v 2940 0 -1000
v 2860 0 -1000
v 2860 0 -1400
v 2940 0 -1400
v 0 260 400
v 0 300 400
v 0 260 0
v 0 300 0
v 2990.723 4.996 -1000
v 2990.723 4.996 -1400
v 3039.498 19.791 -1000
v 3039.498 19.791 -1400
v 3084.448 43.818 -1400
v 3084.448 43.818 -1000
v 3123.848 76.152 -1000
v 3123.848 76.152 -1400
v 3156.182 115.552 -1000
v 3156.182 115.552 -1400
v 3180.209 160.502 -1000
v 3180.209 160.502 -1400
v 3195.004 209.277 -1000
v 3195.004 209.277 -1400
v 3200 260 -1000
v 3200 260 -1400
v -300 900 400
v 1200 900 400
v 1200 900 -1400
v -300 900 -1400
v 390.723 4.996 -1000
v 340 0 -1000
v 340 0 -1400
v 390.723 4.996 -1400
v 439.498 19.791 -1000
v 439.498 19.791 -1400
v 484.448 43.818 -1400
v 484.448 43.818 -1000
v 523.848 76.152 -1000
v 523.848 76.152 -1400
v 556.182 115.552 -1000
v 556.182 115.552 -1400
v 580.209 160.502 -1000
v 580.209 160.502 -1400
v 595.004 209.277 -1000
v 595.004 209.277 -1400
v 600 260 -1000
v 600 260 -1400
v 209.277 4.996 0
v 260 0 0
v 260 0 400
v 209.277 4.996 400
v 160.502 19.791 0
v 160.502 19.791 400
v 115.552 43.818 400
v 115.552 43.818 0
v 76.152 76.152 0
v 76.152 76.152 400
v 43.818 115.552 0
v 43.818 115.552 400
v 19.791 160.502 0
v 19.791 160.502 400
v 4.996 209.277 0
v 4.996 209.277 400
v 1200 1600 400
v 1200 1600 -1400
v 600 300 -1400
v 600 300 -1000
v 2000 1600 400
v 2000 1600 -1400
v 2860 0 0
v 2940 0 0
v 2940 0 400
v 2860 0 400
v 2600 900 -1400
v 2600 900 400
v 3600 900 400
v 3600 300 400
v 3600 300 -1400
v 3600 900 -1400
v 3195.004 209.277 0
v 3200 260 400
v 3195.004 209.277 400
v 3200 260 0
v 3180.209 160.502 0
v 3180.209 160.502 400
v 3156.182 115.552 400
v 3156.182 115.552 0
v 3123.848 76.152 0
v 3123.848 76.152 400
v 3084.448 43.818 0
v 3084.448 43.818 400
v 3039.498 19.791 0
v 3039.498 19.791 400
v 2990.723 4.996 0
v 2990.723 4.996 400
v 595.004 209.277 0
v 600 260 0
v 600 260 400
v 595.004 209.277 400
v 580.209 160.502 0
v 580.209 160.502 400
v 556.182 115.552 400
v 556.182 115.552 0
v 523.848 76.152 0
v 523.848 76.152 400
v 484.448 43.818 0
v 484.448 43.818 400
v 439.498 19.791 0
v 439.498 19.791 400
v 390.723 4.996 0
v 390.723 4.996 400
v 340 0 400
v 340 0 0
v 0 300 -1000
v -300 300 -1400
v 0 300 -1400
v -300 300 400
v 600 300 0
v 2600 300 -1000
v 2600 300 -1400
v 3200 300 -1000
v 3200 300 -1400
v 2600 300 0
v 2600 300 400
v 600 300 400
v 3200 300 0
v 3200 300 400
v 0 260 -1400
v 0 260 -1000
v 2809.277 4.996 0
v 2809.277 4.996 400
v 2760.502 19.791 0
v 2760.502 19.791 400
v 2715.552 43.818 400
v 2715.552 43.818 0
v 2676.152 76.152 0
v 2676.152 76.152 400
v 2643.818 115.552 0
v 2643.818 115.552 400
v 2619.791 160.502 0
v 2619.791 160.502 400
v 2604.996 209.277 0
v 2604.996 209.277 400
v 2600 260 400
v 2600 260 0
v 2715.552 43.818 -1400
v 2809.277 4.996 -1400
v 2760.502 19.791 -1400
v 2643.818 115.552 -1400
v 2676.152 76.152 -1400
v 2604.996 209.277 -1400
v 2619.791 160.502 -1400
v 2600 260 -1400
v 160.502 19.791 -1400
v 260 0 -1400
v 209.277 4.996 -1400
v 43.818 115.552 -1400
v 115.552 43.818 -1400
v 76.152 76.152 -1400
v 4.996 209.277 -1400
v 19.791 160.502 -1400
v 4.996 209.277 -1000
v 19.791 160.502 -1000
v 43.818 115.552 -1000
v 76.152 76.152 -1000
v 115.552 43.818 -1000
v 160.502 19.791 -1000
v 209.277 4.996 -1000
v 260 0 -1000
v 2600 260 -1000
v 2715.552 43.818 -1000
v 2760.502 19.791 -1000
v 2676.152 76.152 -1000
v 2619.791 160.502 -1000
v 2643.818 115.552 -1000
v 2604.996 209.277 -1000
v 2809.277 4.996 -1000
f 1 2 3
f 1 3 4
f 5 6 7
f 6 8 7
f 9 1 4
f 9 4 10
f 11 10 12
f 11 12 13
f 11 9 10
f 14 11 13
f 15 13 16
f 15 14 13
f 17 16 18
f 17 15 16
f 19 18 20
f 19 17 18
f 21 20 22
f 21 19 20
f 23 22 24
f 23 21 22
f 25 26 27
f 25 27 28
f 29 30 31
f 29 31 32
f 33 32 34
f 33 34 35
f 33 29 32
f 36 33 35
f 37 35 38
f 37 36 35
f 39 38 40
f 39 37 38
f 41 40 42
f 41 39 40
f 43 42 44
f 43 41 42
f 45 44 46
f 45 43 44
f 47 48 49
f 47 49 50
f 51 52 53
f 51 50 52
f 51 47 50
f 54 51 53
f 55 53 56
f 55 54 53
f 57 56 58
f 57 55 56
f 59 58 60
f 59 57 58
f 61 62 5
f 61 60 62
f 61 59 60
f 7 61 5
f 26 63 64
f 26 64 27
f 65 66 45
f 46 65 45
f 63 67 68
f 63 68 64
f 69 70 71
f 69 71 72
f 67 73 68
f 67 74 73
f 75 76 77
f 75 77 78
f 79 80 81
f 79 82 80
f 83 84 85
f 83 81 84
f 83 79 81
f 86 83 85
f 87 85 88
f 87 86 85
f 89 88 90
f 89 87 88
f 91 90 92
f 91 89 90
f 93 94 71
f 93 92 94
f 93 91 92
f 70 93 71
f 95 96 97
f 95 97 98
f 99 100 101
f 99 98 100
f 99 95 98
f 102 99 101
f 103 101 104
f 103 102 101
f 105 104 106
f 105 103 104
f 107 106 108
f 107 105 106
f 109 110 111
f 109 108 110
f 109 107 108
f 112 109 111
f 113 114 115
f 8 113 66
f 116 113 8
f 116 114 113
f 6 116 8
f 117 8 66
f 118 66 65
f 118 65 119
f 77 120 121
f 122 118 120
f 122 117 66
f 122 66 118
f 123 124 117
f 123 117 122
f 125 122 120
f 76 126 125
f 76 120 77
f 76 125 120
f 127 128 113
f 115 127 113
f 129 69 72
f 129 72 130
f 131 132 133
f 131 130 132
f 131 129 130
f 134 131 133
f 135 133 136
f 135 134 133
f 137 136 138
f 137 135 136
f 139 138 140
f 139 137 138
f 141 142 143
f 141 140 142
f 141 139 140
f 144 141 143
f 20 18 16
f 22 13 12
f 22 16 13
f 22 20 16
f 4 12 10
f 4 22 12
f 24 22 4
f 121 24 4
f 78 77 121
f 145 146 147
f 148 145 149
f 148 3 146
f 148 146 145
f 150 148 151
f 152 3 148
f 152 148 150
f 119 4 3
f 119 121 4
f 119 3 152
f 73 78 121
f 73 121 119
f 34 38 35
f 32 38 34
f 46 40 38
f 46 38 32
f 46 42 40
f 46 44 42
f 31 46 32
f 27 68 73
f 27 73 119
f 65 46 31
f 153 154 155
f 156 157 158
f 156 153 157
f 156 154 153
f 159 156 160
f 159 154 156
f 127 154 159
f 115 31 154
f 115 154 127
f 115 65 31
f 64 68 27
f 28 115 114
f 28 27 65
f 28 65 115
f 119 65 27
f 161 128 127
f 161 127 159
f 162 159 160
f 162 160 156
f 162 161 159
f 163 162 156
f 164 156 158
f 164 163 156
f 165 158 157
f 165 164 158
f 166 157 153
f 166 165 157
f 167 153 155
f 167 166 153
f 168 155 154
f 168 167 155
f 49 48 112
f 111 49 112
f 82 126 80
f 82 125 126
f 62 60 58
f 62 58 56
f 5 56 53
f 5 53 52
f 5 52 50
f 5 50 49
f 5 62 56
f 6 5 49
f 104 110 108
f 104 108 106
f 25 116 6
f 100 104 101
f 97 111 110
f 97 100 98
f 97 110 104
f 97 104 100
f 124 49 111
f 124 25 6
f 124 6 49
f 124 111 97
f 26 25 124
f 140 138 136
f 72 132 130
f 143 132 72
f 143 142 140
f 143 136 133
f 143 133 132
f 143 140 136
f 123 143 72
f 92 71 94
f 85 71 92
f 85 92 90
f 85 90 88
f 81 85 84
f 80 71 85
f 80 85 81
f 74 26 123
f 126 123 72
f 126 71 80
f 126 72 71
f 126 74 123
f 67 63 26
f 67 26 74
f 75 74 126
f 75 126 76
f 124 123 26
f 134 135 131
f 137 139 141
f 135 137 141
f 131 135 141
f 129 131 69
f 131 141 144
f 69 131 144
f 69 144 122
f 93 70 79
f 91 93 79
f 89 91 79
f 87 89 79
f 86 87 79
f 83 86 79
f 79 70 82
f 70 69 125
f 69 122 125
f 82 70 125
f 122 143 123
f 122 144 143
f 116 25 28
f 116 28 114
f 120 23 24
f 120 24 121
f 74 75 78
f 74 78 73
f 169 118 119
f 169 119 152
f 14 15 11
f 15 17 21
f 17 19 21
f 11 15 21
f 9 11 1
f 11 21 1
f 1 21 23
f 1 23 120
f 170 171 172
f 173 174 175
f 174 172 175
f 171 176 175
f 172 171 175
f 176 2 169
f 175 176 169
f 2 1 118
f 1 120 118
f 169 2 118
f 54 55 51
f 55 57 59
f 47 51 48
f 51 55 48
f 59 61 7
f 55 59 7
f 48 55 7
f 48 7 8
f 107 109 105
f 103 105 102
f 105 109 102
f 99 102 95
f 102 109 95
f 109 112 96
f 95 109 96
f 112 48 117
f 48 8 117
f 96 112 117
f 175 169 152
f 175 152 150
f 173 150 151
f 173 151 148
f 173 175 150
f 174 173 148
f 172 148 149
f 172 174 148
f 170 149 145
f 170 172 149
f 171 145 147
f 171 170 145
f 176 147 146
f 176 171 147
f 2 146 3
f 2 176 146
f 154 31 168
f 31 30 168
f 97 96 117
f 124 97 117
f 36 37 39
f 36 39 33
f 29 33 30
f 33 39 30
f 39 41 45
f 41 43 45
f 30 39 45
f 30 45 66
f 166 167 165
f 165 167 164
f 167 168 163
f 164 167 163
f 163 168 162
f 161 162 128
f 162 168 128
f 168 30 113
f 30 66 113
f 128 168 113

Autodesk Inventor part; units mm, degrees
ref_plane "YZ Plane" through (0, 0, 0) normal (1, 0, 0) x (0, 1, 0)
ref_plane "XZ Plane" through (0, 0, 0) normal (0, 1, 0) x (-1, 0, 0)
ref_plane "XY Plane" through (0, 0, 0) normal (0, 0, 1) x (1, 0, 0)
sketch "Sketch1" plane through (0, 0, 0) normal (0, 0, 1) x (1, 0, 0)
  line L0 (260, 0) -> (340, 0)
  line L1 (600, 260) -> (600, 340)
  line L2 (340, 600) -> (260, 600)
  line L3 (0, 340) -> (0, 260)
  line L4 (2860, 600) -> (2940, 600)
  line L5 (3200, 340) -> (3200, 260)
  line L6 (2940, 0) -> (2860, 0)
  line L7 (2600, 260) -> (2600, 340)
  arc A0 (2, 600) -> (0, 598) centre (2, 598) ccw
  arc A1 (0, 260) -> (260, 0) centre (260, 260) ccw
  arc A2 (340, 0) -> (600, 260) centre (340, 260) ccw
  arc A3 (600, 340) -> (340, 600) centre (340, 340) ccw
  arc A4 (260, 600) -> (0, 340) centre (260, 340) ccw
  arc A5 (2860, 600) -> (2600, 340) centre (2860, 340) ccw
  arc A6 (2600, 260) -> (2860, 0) centre (2860, 260) ccw
  arc A7 (2940, 0) -> (3200, 260) centre (2940, 260) ccw
  arc A8 (3200, 340) -> (2940, 600) centre (2940, 340) ccw
  point P0 (0, 0)
  point P1 (600, 600)
  point P2 (600, 0)
  point P3 (0, 600)
  point P4 (2600, 600)
  point P5 (3200, 0)
  point P6 (3200, 600)
  dimension "d0" = 600
  dimension "d1" = 600
  dimension "d2" = 600
  dimension "d3" = 2000
  dimension "d5" = 260
extrude "Extrusion1" add sketch "Sketch1" along normal blind 400
sketch "Sketch2" plane through (0, 0, 400) normal (0, 0, 1) x (1, 0, 0)
  line L0 (-300, 300) -> (3600, 300)
  line L1 (3600, 300) -> (3600, 900)
  line L2 (3600, 900) -> (2600, 900)
  line L3 (2600, 900) -> (2000, 1600)
  line L4 (2000, 1600) -> (1200, 1600)
  line L5 (1200, 1600) -> (1200, 900)
  line L6 (1200, 900) -> (-300, 900)
  line L7 (-300, 900) -> (-300, 300)
  line L8 (260, 0) -> (340, 0) projected
  line L9 (0, 340) -> (0, 260) projected
  line L10 (3200, 260) -> (3200, 340) projected
  point P0 (0, 0)
  dimension "d8" = 300
  dimension "d9" = 600
  dimension "d10" = 300
  dimension "d11" = 400
  dimension "d12" = 700
  dimension "d13" = 800
  dimension "d14" = 1000
  dimension "d15" = 1500
extrude "Extrusion2" add sketch "Sketch2" against normal blind 900
mirror "Mirror1" about plane through (1639.4502, 743.1128, -500) normal (0, 0, -1)
ref_plane "Work Plane1" through (2600, 300, -500) normal (0, 0, -1) x (-1, 0, 0)
ref_plane "Work Plane2" through (1650, 300, 400) normal (1, 0, 0) x (0, 0, -1)
properties part number "car"
